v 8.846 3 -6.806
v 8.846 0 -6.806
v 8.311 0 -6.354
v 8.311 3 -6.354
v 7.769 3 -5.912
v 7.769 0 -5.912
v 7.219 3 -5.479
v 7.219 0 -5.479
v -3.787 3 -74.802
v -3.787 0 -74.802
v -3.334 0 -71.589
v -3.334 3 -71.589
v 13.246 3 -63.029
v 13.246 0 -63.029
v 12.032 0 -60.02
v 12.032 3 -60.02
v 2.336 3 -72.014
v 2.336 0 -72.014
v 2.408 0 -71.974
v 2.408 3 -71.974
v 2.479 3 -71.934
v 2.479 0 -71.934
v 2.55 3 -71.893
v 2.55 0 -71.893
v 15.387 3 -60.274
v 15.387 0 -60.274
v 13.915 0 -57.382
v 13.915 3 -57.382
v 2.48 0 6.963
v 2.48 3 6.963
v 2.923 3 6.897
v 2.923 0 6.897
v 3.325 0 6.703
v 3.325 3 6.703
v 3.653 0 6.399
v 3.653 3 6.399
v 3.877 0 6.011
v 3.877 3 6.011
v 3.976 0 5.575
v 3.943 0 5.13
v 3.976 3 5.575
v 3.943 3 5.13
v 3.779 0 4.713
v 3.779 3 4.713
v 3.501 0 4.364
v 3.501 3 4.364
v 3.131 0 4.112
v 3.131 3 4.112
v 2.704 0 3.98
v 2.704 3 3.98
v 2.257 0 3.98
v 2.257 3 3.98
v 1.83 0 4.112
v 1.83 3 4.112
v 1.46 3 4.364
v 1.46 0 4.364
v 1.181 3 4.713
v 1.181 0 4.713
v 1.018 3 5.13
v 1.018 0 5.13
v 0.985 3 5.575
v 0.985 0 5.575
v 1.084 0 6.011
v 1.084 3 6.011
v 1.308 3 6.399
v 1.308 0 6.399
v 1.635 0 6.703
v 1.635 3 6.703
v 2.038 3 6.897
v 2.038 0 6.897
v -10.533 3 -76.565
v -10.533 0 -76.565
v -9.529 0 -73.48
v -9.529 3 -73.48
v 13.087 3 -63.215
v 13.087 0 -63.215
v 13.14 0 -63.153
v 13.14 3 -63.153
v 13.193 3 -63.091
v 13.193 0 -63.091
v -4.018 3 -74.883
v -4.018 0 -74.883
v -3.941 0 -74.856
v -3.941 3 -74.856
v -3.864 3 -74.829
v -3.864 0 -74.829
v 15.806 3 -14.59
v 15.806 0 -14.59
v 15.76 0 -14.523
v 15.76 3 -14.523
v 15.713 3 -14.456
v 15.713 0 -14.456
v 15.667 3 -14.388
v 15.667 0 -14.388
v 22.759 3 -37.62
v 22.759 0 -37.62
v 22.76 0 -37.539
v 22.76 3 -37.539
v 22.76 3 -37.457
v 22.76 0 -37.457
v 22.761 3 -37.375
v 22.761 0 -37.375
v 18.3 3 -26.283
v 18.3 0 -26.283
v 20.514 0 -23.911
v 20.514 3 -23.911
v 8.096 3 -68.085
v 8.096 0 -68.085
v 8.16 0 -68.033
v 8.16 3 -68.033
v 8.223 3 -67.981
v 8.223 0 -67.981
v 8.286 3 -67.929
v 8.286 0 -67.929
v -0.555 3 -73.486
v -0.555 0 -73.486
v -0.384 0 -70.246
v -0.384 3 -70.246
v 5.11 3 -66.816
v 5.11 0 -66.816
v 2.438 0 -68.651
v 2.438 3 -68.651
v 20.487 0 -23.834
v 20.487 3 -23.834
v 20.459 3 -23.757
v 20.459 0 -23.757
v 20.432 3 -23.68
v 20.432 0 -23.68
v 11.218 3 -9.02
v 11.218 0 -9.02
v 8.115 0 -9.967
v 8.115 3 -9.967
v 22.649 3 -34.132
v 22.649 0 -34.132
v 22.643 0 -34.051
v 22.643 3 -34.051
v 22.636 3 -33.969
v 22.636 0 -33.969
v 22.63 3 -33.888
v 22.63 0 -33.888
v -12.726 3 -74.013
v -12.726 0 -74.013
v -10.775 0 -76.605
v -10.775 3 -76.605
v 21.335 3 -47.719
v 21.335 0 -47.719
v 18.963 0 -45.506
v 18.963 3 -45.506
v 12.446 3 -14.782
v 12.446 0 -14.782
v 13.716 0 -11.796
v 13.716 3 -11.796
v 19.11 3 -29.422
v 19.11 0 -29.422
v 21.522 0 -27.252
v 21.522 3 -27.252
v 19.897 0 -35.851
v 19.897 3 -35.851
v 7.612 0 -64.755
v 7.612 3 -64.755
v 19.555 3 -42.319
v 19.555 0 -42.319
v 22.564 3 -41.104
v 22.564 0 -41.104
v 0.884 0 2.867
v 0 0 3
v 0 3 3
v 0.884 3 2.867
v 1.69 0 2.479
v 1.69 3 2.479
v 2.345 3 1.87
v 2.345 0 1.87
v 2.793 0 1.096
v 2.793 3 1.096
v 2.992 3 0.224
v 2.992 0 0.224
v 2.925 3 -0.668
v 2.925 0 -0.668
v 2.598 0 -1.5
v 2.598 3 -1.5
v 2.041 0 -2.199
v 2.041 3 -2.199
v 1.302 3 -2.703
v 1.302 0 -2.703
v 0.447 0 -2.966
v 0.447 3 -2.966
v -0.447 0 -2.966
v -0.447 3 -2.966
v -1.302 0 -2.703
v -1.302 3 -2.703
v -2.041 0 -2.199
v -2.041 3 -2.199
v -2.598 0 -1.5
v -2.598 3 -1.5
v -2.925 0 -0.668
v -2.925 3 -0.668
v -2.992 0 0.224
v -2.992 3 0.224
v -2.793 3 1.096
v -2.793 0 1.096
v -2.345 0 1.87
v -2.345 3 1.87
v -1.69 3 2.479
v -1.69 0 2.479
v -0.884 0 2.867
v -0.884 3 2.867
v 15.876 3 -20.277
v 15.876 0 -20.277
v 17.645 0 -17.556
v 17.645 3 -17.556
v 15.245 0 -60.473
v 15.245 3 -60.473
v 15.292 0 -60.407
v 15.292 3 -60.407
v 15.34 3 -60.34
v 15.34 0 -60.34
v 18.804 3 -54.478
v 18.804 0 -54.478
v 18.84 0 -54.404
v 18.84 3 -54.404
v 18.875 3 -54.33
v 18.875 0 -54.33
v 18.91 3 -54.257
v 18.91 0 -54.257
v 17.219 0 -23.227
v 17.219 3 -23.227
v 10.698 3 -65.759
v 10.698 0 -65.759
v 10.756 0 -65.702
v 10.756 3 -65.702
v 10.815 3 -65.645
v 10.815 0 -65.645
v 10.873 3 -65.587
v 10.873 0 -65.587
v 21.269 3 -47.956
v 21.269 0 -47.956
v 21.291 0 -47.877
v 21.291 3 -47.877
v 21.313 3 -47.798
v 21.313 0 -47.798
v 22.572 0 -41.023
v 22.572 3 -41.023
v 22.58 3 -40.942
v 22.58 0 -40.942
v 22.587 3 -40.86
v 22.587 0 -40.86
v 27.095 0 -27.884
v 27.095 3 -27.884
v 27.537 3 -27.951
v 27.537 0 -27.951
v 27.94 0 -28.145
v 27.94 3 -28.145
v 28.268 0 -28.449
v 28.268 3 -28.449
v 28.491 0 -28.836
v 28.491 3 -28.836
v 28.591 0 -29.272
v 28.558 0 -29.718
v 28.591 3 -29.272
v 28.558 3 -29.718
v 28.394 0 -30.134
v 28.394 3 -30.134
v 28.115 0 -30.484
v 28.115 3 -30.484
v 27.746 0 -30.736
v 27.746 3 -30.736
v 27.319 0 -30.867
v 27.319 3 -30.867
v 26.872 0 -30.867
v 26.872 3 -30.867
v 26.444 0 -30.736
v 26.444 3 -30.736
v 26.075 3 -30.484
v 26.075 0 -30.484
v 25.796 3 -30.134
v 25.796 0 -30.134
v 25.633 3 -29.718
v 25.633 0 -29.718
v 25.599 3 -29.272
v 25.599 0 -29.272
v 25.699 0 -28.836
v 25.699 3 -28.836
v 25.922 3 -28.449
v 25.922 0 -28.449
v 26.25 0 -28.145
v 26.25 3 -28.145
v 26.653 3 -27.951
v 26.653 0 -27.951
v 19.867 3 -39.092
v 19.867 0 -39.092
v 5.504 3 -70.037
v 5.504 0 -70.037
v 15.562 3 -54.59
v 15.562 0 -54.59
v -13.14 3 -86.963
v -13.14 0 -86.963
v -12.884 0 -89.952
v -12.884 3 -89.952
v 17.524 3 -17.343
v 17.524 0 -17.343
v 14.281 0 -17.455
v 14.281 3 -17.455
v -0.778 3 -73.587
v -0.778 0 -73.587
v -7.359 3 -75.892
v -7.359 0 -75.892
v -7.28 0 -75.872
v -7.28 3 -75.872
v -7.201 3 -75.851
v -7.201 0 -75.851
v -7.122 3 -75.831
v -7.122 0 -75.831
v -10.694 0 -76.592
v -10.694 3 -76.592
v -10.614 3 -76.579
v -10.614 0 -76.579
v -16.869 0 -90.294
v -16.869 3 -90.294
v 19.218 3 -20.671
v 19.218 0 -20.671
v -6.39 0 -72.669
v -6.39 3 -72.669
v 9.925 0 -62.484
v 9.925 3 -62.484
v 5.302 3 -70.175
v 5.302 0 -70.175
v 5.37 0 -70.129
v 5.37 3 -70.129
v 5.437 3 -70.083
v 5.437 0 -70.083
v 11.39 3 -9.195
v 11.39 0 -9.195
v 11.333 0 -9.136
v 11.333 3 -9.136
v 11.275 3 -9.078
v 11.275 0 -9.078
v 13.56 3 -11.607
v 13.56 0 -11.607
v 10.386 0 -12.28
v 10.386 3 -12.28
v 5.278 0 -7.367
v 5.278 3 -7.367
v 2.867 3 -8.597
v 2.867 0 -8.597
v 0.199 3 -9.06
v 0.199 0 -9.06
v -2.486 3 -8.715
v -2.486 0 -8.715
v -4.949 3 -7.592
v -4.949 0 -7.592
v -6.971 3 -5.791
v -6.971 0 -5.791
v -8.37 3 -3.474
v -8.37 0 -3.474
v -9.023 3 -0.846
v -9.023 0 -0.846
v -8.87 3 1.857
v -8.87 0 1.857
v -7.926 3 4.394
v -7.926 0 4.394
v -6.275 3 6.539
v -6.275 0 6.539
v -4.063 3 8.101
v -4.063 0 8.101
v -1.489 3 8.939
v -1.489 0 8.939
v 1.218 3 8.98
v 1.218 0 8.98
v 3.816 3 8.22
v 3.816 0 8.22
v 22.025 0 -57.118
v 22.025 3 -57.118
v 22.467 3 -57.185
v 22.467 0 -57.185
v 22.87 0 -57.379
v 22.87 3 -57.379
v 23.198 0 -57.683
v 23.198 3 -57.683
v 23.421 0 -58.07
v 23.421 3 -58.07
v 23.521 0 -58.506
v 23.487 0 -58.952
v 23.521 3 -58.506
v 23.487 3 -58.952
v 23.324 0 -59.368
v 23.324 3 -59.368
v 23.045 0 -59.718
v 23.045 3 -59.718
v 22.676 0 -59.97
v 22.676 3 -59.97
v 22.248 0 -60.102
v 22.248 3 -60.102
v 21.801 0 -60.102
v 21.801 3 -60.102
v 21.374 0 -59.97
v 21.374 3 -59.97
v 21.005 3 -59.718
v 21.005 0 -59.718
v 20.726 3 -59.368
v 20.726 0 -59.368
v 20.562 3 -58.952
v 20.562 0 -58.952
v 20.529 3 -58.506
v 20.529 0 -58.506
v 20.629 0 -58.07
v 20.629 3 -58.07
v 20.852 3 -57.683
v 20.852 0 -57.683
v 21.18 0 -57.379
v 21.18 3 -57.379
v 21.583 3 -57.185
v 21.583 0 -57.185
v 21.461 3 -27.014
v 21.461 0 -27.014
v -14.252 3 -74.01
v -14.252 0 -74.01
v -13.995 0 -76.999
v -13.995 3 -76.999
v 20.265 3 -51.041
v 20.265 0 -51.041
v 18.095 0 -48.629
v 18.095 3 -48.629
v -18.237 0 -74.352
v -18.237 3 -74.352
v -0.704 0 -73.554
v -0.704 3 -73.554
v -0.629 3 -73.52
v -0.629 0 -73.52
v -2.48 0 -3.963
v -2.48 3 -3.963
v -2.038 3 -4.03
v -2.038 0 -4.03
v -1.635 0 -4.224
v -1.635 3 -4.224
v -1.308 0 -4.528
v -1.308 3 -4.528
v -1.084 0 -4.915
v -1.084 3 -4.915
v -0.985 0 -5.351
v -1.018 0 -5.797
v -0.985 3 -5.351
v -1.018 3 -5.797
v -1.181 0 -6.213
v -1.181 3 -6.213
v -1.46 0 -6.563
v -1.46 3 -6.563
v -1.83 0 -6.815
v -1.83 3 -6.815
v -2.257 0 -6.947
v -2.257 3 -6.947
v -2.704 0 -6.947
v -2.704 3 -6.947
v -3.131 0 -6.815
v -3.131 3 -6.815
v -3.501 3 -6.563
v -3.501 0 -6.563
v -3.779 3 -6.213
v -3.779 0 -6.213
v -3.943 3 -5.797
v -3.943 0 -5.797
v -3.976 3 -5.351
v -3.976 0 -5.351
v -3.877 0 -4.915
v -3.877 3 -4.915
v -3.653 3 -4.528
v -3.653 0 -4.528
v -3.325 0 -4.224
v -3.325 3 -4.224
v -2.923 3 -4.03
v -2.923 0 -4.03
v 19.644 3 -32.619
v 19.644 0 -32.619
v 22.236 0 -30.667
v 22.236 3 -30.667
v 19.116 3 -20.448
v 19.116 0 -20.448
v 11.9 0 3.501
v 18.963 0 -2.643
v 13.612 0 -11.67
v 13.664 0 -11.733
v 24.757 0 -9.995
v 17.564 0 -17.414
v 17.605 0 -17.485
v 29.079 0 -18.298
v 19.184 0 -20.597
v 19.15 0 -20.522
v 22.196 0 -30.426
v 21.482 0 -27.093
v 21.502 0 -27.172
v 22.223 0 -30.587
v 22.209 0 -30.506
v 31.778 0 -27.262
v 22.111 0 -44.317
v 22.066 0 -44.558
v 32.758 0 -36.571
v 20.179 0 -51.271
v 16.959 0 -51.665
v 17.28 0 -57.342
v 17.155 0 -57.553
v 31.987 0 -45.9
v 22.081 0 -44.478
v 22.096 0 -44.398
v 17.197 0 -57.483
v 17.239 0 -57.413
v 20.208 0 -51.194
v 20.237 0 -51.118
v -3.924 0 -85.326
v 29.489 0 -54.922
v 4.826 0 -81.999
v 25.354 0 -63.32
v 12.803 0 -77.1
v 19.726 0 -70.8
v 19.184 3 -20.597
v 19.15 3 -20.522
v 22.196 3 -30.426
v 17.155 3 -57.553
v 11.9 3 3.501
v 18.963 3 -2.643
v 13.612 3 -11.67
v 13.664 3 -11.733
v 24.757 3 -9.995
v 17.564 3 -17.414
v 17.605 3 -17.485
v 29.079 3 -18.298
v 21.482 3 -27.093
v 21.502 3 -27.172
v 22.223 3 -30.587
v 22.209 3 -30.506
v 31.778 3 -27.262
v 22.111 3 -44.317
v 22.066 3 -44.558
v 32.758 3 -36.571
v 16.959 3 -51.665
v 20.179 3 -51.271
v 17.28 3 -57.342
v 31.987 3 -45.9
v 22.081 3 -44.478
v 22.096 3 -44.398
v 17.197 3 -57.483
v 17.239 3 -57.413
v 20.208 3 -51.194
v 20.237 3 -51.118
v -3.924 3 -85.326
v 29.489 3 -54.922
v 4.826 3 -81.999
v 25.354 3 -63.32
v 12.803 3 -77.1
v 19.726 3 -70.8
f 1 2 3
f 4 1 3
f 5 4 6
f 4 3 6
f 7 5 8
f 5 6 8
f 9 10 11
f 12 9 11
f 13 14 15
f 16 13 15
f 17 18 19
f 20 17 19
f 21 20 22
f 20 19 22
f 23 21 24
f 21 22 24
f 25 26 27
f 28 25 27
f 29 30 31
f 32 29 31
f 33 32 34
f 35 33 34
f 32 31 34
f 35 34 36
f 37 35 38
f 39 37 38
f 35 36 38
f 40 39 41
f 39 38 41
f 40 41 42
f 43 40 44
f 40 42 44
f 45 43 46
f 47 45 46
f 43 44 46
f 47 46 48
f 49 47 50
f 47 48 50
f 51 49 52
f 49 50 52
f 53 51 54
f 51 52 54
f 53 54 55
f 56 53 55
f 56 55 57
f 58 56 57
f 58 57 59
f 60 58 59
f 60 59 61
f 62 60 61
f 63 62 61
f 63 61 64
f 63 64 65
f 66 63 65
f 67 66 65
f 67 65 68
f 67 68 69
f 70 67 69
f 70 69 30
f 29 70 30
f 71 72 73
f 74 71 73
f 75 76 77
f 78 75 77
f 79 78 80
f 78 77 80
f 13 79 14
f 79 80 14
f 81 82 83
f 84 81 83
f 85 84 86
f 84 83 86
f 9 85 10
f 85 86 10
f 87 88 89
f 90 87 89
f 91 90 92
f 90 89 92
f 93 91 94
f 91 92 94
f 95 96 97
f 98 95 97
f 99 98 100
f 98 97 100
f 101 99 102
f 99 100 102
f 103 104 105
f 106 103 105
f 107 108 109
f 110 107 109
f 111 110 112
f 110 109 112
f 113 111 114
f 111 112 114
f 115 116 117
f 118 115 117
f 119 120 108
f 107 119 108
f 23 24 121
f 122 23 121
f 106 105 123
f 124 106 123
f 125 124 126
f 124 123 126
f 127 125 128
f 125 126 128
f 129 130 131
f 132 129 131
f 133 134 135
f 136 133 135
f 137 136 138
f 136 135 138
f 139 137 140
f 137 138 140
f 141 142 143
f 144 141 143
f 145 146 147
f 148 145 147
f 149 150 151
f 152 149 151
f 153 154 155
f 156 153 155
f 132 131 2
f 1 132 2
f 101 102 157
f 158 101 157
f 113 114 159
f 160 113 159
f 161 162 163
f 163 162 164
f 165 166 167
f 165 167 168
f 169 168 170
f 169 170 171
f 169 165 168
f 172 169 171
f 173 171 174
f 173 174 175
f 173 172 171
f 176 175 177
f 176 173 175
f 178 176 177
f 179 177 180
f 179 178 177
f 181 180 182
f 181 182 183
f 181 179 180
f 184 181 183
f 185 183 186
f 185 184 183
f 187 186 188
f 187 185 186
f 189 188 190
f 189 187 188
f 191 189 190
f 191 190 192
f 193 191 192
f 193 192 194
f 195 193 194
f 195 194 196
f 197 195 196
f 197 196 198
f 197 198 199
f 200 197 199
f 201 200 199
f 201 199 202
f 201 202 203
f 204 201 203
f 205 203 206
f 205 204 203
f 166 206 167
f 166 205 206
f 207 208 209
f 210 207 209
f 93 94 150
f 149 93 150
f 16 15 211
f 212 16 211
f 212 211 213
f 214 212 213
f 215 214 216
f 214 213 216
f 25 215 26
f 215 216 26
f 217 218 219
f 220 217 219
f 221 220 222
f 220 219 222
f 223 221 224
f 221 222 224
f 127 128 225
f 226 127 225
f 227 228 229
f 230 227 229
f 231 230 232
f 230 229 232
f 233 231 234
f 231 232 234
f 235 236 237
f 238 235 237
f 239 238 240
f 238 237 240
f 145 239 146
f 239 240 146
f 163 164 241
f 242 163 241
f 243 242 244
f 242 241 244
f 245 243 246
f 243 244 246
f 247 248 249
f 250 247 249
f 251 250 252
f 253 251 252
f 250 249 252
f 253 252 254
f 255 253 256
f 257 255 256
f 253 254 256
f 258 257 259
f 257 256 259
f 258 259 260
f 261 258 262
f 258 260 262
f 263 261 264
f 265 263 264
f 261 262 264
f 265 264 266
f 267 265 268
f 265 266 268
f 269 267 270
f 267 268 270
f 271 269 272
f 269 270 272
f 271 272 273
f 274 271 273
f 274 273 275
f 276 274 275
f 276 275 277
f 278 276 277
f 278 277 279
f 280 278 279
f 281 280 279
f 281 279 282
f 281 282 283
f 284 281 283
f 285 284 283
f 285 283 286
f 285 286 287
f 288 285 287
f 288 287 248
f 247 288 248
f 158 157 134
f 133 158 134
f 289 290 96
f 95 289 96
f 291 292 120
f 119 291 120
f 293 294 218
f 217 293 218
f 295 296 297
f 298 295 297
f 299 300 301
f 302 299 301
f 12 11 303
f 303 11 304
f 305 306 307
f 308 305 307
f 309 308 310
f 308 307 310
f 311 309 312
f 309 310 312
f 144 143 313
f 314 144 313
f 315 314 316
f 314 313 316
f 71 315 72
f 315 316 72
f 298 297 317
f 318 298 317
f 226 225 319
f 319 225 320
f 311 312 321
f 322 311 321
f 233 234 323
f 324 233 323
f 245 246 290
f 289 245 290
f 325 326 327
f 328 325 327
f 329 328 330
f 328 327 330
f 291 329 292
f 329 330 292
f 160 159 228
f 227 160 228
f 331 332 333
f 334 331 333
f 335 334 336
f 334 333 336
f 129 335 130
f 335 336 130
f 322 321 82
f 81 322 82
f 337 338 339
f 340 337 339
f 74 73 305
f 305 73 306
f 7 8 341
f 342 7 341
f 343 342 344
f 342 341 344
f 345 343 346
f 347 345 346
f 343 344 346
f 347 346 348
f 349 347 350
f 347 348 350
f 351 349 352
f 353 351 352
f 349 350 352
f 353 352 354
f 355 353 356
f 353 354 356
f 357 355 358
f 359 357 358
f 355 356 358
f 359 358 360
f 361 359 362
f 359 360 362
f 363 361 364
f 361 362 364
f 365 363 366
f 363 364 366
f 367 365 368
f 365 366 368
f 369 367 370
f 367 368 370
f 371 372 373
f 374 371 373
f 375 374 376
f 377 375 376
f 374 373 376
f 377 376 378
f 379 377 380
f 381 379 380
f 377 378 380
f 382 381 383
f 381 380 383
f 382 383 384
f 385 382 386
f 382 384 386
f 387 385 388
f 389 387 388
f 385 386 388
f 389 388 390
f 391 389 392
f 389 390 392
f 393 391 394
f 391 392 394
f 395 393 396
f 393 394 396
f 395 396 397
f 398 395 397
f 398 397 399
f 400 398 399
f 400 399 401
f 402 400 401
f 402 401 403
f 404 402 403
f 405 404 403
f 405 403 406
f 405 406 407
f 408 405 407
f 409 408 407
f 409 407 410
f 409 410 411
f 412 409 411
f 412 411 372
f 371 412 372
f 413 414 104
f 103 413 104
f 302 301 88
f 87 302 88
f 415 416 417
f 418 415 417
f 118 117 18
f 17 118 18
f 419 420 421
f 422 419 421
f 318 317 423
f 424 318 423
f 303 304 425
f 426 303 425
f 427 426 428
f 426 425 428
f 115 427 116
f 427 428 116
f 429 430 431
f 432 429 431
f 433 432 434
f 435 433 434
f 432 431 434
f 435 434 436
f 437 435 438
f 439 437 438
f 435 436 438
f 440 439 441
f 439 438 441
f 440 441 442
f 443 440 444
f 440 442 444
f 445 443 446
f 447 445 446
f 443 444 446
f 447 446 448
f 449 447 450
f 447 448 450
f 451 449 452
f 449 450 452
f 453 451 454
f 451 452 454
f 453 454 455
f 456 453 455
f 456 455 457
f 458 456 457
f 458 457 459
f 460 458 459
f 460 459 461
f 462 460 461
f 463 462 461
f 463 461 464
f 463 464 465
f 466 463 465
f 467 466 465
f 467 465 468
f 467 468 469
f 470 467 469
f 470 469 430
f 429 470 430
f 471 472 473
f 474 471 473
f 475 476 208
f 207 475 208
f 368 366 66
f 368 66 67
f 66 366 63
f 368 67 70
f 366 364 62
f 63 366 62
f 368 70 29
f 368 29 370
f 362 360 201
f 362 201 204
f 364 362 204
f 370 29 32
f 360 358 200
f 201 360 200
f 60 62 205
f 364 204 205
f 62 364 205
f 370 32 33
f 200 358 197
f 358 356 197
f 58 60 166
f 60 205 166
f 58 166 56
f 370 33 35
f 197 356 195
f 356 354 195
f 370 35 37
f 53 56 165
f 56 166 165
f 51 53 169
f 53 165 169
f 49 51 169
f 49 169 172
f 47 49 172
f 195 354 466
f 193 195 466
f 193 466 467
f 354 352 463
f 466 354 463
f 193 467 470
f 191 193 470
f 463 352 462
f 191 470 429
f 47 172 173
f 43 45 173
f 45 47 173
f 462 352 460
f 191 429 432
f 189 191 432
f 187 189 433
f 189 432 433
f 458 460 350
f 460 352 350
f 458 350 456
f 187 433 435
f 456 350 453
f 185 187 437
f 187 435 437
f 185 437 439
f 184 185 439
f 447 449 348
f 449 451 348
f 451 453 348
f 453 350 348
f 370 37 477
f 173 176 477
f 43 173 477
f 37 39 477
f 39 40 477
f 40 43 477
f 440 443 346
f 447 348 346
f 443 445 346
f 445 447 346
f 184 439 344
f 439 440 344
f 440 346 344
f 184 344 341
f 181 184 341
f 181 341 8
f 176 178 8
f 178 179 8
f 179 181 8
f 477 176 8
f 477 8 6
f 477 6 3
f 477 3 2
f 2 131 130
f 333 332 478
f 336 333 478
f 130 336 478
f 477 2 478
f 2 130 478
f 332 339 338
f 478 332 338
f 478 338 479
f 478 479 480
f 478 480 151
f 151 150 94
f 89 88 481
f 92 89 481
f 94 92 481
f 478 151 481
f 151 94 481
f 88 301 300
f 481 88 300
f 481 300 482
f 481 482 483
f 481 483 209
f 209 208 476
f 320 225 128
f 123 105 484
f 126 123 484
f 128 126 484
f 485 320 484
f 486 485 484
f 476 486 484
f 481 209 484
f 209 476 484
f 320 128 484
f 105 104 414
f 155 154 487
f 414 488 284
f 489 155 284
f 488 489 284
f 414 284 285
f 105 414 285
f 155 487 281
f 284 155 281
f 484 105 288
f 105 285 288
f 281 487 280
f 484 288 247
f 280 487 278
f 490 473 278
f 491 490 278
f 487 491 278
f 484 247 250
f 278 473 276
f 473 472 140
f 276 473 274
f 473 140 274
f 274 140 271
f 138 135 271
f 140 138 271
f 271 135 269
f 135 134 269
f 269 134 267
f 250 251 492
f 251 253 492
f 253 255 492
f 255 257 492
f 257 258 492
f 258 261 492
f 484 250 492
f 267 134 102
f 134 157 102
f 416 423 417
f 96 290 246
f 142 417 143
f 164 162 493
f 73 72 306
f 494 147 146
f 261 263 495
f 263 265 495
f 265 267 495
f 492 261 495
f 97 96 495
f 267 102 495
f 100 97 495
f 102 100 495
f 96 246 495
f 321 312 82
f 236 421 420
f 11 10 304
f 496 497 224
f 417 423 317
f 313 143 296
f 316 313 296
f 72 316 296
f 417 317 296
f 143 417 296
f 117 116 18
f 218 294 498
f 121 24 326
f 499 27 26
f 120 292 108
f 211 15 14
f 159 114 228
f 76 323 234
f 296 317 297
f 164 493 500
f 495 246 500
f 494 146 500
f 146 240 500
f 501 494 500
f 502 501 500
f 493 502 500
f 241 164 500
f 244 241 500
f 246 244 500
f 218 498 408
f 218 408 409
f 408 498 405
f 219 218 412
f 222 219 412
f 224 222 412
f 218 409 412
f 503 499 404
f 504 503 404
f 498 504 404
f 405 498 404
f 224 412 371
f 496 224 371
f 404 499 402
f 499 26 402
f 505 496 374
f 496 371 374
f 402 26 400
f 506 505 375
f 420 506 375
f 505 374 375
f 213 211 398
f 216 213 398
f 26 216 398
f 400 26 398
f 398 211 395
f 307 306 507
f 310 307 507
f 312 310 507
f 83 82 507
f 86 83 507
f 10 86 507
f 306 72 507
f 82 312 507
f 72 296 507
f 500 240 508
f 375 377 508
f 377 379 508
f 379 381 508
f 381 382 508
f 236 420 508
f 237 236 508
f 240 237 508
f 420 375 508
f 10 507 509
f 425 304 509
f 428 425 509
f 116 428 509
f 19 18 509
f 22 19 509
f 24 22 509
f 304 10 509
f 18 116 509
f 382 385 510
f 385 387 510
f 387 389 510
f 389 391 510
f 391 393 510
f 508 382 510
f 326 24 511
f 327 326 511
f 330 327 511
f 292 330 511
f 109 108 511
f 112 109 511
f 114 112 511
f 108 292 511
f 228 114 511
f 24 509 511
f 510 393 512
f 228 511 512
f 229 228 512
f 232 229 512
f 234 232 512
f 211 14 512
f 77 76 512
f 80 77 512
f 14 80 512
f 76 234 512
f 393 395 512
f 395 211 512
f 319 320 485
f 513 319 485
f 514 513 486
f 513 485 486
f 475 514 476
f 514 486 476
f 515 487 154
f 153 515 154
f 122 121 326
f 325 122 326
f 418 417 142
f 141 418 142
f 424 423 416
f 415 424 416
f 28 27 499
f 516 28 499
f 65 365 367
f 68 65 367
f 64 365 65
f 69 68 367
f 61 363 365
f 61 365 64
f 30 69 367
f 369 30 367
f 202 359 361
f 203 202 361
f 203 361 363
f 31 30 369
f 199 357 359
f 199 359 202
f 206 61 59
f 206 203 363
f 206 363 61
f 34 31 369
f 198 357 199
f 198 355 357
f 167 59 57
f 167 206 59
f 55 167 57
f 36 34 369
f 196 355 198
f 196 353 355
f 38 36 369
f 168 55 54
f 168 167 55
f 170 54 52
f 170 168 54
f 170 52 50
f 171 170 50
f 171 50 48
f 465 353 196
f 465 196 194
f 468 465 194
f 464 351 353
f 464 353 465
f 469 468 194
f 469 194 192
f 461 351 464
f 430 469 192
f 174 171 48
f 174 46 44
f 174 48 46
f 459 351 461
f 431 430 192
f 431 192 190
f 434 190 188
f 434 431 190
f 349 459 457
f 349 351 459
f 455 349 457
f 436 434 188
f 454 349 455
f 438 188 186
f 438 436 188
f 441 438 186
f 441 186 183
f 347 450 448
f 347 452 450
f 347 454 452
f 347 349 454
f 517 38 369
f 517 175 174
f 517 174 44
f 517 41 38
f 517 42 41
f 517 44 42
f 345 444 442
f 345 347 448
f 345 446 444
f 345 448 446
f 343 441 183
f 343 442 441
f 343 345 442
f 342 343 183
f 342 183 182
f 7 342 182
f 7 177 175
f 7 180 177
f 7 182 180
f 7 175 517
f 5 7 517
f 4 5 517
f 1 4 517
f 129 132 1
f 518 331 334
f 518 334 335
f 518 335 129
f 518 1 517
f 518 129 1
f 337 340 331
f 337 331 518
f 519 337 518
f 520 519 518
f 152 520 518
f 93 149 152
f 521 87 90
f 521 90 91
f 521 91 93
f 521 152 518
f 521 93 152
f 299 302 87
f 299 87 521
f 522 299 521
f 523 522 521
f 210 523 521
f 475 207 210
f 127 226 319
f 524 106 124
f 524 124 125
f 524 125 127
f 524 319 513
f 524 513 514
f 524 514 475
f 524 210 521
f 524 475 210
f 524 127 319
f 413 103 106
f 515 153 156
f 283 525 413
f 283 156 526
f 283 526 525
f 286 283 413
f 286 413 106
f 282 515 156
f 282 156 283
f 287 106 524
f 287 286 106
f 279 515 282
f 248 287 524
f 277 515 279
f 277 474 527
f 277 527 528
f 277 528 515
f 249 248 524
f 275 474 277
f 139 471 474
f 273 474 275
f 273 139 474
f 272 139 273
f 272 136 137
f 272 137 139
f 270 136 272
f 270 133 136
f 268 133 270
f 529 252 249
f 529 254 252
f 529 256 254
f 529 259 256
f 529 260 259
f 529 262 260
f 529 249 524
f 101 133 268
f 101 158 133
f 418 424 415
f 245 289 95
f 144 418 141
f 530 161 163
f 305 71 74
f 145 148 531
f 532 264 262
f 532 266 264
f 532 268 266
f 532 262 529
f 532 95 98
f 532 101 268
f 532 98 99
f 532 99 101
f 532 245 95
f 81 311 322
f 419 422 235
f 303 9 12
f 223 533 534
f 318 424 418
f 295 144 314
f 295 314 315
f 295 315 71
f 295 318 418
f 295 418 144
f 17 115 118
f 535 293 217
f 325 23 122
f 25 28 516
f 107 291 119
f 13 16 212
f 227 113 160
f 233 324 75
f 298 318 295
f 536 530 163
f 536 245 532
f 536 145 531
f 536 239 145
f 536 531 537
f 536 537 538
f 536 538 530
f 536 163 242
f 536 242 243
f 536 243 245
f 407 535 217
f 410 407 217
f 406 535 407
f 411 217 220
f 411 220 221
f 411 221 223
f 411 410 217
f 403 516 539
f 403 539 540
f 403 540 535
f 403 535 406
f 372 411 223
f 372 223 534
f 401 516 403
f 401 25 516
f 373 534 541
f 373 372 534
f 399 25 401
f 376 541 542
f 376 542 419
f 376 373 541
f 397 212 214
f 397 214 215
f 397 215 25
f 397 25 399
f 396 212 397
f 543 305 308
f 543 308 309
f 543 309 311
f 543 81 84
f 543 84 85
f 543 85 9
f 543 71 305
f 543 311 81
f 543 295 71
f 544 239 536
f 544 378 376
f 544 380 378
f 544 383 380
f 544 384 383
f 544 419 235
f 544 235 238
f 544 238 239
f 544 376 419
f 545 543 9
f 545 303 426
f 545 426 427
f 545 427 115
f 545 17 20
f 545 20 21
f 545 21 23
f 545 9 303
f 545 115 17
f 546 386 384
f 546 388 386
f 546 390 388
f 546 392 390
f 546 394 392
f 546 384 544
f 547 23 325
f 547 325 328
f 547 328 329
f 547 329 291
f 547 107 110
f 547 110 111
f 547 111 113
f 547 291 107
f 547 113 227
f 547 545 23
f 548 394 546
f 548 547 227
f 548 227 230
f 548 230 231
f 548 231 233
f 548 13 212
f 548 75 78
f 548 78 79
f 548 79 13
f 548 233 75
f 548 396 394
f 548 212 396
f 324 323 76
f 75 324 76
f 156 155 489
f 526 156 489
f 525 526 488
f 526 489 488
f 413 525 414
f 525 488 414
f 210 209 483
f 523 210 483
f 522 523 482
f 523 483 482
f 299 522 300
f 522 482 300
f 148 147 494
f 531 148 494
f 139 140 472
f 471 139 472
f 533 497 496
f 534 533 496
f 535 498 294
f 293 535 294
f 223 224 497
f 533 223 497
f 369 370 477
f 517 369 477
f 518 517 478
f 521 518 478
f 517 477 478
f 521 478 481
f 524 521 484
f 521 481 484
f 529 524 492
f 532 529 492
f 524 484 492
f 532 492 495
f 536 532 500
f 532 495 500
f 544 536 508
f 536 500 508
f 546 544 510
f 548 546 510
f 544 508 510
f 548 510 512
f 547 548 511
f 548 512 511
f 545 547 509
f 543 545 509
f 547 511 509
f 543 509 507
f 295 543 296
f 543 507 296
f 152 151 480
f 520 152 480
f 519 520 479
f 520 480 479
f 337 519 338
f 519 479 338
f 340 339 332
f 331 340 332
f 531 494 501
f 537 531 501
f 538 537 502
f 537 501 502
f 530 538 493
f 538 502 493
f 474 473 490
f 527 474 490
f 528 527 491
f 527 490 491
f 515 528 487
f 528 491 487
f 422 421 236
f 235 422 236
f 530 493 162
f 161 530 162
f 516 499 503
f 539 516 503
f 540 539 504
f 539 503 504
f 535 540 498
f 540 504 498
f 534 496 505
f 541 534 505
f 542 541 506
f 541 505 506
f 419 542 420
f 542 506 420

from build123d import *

# Parameters (mm, degrees)
SKETCH_1_R          = 3
EXTRUDE_1_DEPTH     = 3
SKETCH_2_R          = 1.5
CUT_EXTRUDE_1_DEPTH = 35
SKETCH_3_R          = 1.5
CUT_EXTRUDE_2_DEPTH = 10


with BuildPart() as part:
    # 草图1 → 凸台-拉伸1 (new body)
    with BuildSketch(Plane(origin=(0, 0, 0), x_dir=(1, 0, 0), z_dir=(0, 1, 0))):
        with BuildLine():
            Line((-14.251933165, 74.010414785), (-13.995374148, 76.999384294))
            Line((-13.995374148, 76.999384294), (-12.726300539, 74.013284805))
            Line((-12.726300539, 74.013284805), (-10.774799328, 76.605384534))
            ThreePointArc((-10.774799328, 76.605384534), (-10.653849778, 76.585389633), (-10.532962075, 76.565024143))
            Line((-10.532962075, 76.565024143), (-9.528973393, 73.479680611))
            Line((-9.528973393, 73.479680611), (-7.358981856, 75.891832081))
            ThreePointArc((-7.358981856, 75.891832081), (-7.240235225, 75.861371819), (-7.121582506, 75.830547768))
            Line((-7.121582506, 75.830547768), (-6.390319712, 72.669441521))
            Line((-6.390319712, 72.669441521), (-4.018352795, 74.883286801))
            ThreePointArc((-4.018352795, 74.883286801), (-3.902712818, 74.842592999), (-3.787198101, 74.801544977))
            Line((-3.787198101, 74.801544977), (-3.334226545, 71.588733941))
            Line((-3.334226545, 71.588733941), (-0.778336348, 73.587424334))
            ThreePointArc((-0.778336348, 73.587424334), (-0.666683115, 73.536806696), (-0.555185537, 73.485847103))
            Line((-0.555185537, 73.485847103), (-0.383952607, 70.245782711))
            Line((-0.383952607, 70.245782711), (2.336409001, 72.014106975))
            ThreePointArc((2.336409001, 72.014106975), (2.443225743, 71.953950731), (2.549857617, 71.893467401))
            Line((2.549857617, 71.893467401), (2.438048736, 68.650808499))
            Line((2.438048736, 68.650808499), (5.302178162, 70.175308618))
            ThreePointArc((5.302178162, 70.175308618), (5.403345471, 70.106071595), (5.504300109, 70.036524842))
            Line((5.504300109, 70.036524842), (5.110300349, 66.815950022))
            Line((5.110300349, 66.815950022), (8.096399838, 68.085023631))
            ThreePointArc((8.096399838, 68.085023631), (8.191147771, 68.007232764), (8.285656848, 67.929151881))
            Line((8.285656848, 67.929151881), (7.612464785, 64.755171662))
            Line((7.612464785, 64.755171662), (10.697808317, 65.759160344))
            ThreePointArc((10.697808317, 65.759160344), (10.785415785, 65.673407668), (10.872760029, 65.587386897))
            Line((10.872760029, 65.587386897), (9.925499062, 62.484157186))
            Line((9.925499062, 62.484157186), (13.086605309, 63.21541998))
            ThreePointArc((13.086605309, 63.21541998), (13.166405566, 63.122358125), (13.245920234, 63.029052137))
            Line((13.245920234, 63.029052137), (12.031799591, 60.020190385))
            Line((12.031799591, 60.020190385), (15.244610627, 60.473161941))
            ThreePointArc((15.244610627, 60.473161941), (15.315996344, 60.373499163), (15.387076283, 60.273618073))
            Line((15.387076283, 60.273618073), (13.915336154, 57.382023534))
            Line((13.915336154, 57.382023534), (17.155400546, 57.553256464))
            ThreePointArc((17.155400546, 57.553256464), (17.217828436, 57.447751259), (17.279932683, 57.342055221))
            Line((17.279932683, 57.342055221), (15.561773901, 54.589734677))
            Line((15.561773901, 54.589734677), (18.804432803, 54.477925795))
            ThreePointArc((18.804432803, 54.477925795), (18.857427751, 54.36738112), (18.910083656, 54.256674546))
            Line((18.910083656, 54.256674546), (16.958582445, 51.664574817))
            Line((16.958582445, 51.664574817), (20.179157265, 51.270575057))
            ThreePointArc((20.179157265, 51.270575057), (20.222315948, 51.155832223), (20.265122768, 51.040957657))
            Line((20.265122768, 51.040957657), (18.095131231, 48.628806187))
            Line((18.095131231, 48.628806187), (21.26911145, 47.955614125))
            ThreePointArc((21.26911145, 47.955614125), (21.302105404, 47.837546395), (21.334737353, 47.719378101))
            Line((21.334737353, 47.719378101), (18.962770436, 45.50553282))
            Line((18.962770436, 45.50553282), (22.066000147, 44.558271853))
            ThreePointArc((22.066000147, 44.558271853), (22.088578269, 44.437777794), (22.110786998, 44.317215104))
            Line((22.110786998, 44.317215104), (19.554896802, 42.318524712))
            Line((19.554896802, 42.318524712), (22.563758554, 41.104404068))
            ThreePointArc((22.563758554, 41.104404068), (22.57574901, 40.982400713), (22.587365497, 40.860361182))
            Line((22.587365497, 40.860361182), (19.867003889, 39.092036918))
            Line((19.867003889, 39.092036918), (22.758598428, 37.62029679))
            ThreePointArc((22.758598428, 37.62029679), (22.759909963, 37.497712656), (22.7608458, 37.375125079))
            Line((22.7608458, 37.375125079), (19.896716374, 35.85062496))
            Line((19.896716374, 35.85062496), (22.649036919, 34.132466177))
            ThreePointArc((22.649036919, 34.132466177), (22.639659553, 34.010234206), (22.629907617, 33.888031548))
            Line((22.629907617, 33.888031548), (19.643808128, 32.618957939))
            Line((19.643808128, 32.618957939), (22.235907857, 30.667456728))
            ThreePointArc((22.235907857, 30.667456728), (22.215912956, 30.546507177), (22.195547466, 30.425619474))
            Line((22.195547466, 30.425619474), (19.110203935, 29.421630793))
            Line((19.110203935, 29.421630793), (21.522355404, 27.251639255))
            ThreePointArc((21.522355404, 27.251639255), (21.491895142, 27.132892625), (21.461071091, 27.014239906))
            Line((21.461071091, 27.014239906), (18.299964844, 26.282977111))
            Line((18.299964844, 26.282977111), (20.513810124, 23.911010194))
            ThreePointArc((20.513810124, 23.911010194), (20.473116322, 23.795370217), (20.432068301, 23.6798555))
            Line((20.432068301, 23.6798555), (17.219257265, 23.226883944))
            Line((17.219257265, 23.226883944), (19.217947657, 20.670993748))
            ThreePointArc((19.217947657, 20.670993748), (19.167330019, 20.559340514), (19.116370426, 20.447842937))
            Line((19.116370426, 20.447842937), (15.876306034, 20.276610007))
            Line((15.876306034, 20.276610007), (17.644630298, 17.556248398))
            ThreePointArc((17.644630298, 17.556248398), (17.584474055, 17.449431657), (17.523990725, 17.342799782))
            Line((17.523990725, 17.342799782), (14.281331822, 17.454608664))
            Line((14.281331822, 17.454608664), (15.805831942, 14.590479238))
            ThreePointArc((15.805831942, 14.590479238), (15.736594919, 14.489311928), (15.667048166, 14.38835729))
            Line((15.667048166, 14.38835729), (12.446473346, 14.78235705))
            Line((12.446473346, 14.78235705), (13.715546954, 11.796257561))
            ThreePointArc((13.715546954, 11.796257561), (13.637756087, 11.701509628), (13.559675204, 11.607000551))
            Line((13.559675204, 11.607000551), (10.385694985, 12.280192614))
            Line((10.385694985, 12.280192614), (11.389683667, 9.194849082))
            ThreePointArc((11.389683667, 9.194849082), (11.303930991, 9.107241614), (11.217910221, 9.019897371))
            Line((11.217910221, 9.019897371), (8.114680509, 9.967158338))
            Line((8.114680509, 9.967158338), (8.845943303, 6.80605209))
            ThreePointArc((8.845943303, 6.80605209), (8.041013726, 6.131861333), (7.218665918, 5.479029897))
            ThreePointArc((7.218665918, 5.479029897), (-8.795258648, 2.184566676), (3.816136485, -8.219854535))
            ThreePointArc((3.816136485, -8.219854535), (31.986599548, 45.900244344), (-13.140159276, 86.962827432))
            Line((-13.140159276, 86.962827432), (-12.883600259, 89.951796941))
            Line((-12.883600259, 89.951796941), (-16.868945799, 90.293880168))
            Line((-16.868945799, 90.293880168), (-18.237278704, 74.352498011))
            Line((-18.237278704, 74.352498011), (-14.251933165, 74.010414785))
        make_face()
        with Locations(Location((0, 0, 0), (0, 0, 270))):
            Circle(SKETCH_1_R, mode=Mode.SUBTRACT)
    extrude(amount=EXTRUDE_1_DEPTH)

    # 草图2 → 切除-拉伸1 (cut)
    with BuildSketch(Plane(origin=(0, 3, 0), x_dir=(1, 0, 0), z_dir=(0, 1, 0))):
        with Locations(Location((-2.480429629, 5.463283706, 0), (0, 0, 270))):
            Circle(SKETCH_2_R)
        with Locations(Location((2.480429629, -5.463283706, 0), (0, 0, 270))):
            Circle(SKETCH_2_R)
    extrude(amount=-CUT_EXTRUDE_1_DEPTH, mode=Mode.SUBTRACT)

    # 草图3 → 切除-拉伸2 (cut)
    with BuildSketch(Plane(origin=(0, 3, 0), x_dir=(1, 0, 0), z_dir=(0, 1, 0))):
        with Locations(Location((27.095115734, 29.384103679, 0), (0, 0, 270))):
            Circle(SKETCH_3_R)
        with Locations(Location((22.024822818, 58.618310712, 0), (0, 0, 270))):
            Circle(SKETCH_3_R)
    extrude(amount=-CUT_EXTRUDE_2_DEPTH, mode=Mode.SUBTRACT)


solid = part.part
